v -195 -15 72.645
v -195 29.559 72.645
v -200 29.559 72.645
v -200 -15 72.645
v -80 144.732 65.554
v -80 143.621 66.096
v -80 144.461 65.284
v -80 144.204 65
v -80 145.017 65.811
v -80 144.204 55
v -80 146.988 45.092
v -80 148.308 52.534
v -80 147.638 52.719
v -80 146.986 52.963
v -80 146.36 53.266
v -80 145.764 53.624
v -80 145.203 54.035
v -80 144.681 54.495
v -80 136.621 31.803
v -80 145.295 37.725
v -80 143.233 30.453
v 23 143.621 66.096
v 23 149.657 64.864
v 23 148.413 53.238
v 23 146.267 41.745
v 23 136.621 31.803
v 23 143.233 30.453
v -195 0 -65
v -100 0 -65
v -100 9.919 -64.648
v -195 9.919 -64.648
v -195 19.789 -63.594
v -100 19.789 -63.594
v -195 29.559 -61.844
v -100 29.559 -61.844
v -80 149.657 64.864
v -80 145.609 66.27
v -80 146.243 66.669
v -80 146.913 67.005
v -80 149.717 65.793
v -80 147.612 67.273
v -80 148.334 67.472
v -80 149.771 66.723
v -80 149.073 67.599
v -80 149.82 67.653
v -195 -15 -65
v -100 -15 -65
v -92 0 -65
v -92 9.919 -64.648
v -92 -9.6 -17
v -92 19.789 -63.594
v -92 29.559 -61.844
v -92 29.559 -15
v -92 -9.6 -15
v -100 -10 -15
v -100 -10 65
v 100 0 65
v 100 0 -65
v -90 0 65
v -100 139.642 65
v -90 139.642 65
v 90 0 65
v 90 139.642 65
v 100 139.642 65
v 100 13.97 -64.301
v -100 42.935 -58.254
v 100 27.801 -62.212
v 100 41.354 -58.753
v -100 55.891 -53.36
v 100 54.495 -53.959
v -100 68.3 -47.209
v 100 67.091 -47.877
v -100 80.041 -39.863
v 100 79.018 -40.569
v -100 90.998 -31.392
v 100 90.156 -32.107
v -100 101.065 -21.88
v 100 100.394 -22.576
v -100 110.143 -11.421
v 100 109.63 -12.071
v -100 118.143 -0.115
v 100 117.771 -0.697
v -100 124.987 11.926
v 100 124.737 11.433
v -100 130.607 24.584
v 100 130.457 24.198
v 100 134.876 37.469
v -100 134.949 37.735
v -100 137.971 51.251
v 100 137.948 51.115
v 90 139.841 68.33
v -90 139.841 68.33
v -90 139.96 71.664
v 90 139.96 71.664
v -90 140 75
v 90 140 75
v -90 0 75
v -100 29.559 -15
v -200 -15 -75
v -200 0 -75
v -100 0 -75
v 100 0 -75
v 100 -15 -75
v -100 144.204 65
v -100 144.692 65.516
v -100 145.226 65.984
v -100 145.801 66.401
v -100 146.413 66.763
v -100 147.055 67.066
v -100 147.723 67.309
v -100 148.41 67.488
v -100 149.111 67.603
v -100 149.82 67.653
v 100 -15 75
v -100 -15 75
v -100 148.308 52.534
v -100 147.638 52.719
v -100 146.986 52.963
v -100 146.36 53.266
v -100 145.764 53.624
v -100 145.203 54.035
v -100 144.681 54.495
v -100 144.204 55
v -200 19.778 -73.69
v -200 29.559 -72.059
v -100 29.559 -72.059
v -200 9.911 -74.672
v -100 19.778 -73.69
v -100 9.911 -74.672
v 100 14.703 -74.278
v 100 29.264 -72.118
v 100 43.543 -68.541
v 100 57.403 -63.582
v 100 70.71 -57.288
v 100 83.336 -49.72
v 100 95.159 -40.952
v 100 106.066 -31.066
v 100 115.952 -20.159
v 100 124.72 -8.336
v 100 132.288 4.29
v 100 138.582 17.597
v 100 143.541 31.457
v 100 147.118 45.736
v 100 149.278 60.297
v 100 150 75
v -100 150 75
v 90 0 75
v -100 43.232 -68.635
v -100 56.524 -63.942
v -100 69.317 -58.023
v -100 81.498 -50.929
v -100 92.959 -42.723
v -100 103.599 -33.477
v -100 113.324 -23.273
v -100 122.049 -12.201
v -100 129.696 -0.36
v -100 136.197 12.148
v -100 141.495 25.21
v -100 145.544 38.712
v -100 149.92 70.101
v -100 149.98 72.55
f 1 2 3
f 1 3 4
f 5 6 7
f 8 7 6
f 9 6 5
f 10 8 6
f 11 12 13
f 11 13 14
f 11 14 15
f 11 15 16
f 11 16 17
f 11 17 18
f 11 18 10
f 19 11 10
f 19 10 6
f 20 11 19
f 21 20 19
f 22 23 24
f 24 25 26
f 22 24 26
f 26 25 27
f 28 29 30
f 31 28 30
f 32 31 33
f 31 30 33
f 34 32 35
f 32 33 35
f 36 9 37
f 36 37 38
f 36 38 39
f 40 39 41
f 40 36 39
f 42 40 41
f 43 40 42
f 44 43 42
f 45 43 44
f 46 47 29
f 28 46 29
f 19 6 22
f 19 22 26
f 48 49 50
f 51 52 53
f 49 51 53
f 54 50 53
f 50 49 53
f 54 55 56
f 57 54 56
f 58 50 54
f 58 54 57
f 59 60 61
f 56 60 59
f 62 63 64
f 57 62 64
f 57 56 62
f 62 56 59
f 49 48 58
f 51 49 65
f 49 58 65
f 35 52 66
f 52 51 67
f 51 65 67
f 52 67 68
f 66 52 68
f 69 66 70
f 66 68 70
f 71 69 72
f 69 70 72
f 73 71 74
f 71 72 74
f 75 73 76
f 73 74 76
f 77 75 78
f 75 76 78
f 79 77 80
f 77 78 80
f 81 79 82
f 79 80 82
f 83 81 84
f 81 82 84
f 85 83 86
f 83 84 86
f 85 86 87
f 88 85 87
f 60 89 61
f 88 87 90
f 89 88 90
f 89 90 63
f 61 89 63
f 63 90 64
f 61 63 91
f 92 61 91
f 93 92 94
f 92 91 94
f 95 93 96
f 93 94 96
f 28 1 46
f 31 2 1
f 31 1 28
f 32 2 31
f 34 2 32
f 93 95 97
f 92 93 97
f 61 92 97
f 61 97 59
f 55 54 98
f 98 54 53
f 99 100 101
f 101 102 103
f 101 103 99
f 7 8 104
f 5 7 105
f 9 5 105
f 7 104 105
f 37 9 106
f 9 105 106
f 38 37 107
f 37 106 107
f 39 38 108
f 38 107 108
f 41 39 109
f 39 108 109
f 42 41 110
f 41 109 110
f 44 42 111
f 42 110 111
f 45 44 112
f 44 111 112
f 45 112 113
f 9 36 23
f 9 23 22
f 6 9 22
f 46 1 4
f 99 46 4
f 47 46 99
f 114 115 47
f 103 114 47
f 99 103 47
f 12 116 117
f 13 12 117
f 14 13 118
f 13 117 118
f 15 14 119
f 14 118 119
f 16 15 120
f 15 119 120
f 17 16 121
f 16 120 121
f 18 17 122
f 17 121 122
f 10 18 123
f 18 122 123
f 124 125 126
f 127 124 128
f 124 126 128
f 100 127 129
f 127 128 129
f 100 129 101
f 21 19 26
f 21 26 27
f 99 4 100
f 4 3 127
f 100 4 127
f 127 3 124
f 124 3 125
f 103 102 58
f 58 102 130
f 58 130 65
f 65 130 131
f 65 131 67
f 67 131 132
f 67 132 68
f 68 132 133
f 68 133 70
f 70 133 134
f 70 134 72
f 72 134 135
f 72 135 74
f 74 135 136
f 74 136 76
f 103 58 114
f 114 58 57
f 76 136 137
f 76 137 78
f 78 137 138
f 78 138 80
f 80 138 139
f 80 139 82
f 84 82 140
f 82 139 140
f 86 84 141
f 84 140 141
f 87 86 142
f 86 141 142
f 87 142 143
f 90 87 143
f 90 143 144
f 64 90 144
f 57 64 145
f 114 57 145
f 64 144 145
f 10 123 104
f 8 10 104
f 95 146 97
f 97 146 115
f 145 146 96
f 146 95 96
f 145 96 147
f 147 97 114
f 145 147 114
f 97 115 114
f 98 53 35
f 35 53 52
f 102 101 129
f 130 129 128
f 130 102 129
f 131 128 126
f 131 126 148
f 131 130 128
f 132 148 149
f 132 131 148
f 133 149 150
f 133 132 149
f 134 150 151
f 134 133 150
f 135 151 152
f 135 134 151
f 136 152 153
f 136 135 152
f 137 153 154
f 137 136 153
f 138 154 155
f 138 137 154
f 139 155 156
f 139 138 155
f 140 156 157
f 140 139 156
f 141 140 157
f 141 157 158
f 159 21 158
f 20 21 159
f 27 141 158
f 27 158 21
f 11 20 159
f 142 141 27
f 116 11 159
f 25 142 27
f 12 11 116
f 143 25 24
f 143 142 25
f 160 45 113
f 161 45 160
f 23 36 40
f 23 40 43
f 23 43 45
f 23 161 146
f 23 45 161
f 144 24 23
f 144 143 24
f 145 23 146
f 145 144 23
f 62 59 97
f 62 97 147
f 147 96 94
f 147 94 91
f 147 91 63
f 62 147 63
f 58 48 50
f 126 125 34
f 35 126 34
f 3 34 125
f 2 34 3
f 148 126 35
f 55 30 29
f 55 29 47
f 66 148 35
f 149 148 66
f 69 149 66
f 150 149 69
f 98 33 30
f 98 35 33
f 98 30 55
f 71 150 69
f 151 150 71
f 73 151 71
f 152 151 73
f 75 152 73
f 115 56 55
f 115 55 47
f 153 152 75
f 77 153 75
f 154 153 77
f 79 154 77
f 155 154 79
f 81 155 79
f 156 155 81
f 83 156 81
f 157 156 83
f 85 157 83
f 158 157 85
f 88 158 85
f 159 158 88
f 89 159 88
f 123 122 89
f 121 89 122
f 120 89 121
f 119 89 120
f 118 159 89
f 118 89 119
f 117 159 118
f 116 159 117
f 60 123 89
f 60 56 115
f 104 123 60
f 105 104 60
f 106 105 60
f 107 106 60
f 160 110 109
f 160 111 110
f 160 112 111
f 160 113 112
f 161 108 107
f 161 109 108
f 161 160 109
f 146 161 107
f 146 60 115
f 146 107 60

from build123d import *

# Parameters (mm, degrees)
SKETCH1_W                = 200
SKETCH1_H                = 150
BOSS_EXTRUDE1_DEPTH      = 15
SKETCH1_5_W              = 200
SKETCH1_5_H              = 10
REVOLVE1_ANGLE           = 90
BOSS_EXTRUDE3_REACH      = 197.256
BOSS_EXTRUDE3_END_RADIUS = 140
SKETCH1_6_W              = 10
SKETCH1_6_H              = 10
CUT_EXTRUDE2_DEPTH       = 103
CUT_EXTRUDE3_DEPTH       = 20
CUT_LOFT8_START          = -65
CUT_LOFT8_DEPTH          = 130
CUT_LOFT8_START_2        = -100
CUT_LOFT8_2_DEPTH        = 200
BOSS_EXTRUDE5_DEPTH      = 100
BOSS_EXTRUDE6_START      = -8
BOSS_EXTRUDE6_DEPTH      = 8
BOSS_EXTRUDE7_START      = -5
BOSS_EXTRUDE7_DEPTH      = 5


with BuildPart() as part:
    # Sketch1 → Boss-Extrude1 (new body)
    with BuildSketch(Plane(origin=(0, 0, 0), x_dir=(1, 0, 0), z_dir=(0, 1, 0))):
        Rectangle(SKETCH1_W, SKETCH1_H)
    extrude(amount=-BOSS_EXTRUDE1_DEPTH)

    # Sketch1<5> → Revolve1 (revolve)
    with BuildSketch(Plane(origin=(0, 0, 0), x_dir=(1, 0, 0), z_dir=(0, 1, 0))):
        with Locations((0, 70)):
            Rectangle(SKETCH1_5_W, SKETCH1_5_H)
    revolve(axis=Axis((-100, 0, 75), (1, 0, 0)), revolution_arc=REVOLVE1_ANGLE)

    # Boss-Extrude3: up to this cylinder (the profile starts inside it)
    boss_extrude3_end = Plane(origin=(0, 0, 75), z_dir=(-1, 0, 0)) * Cylinder(BOSS_EXTRUDE3_END_RADIUS, 865.512, mode=Mode.PRIVATE)
    # Sketch1<6> → Boss-Extrude3 (add, up to the surface)
    with BuildSketch(Plane(origin=(0, 0, 0), x_dir=(1, 0, 0), z_dir=(0, 1, 0)), mode=Mode.PRIVATE) as boss_extrude3_sk1:
        with Locations((-95, -70)):
            Rectangle(SKETCH1_6_W, SKETCH1_6_H)
    boss_extrude3_tool1 = extrude(boss_extrude3_sk1.sketch, amount=BOSS_EXTRUDE3_REACH, mode=Mode.PRIVATE) & boss_extrude3_end
    add(boss_extrude3_tool1.solids().sort_by_distance((-95, 0, 70))[0])
    # Sketch1<6> → Boss-Extrude3 (add, up to the surface)
    with BuildSketch(Plane(origin=(0, 0, 0), x_dir=(1, 0, 0), z_dir=(0, 1, 0)), mode=Mode.PRIVATE) as boss_extrude3_sk2:
        with Locations((95, -70)):
            Rectangle(SKETCH1_6_W, SKETCH1_6_H)
    boss_extrude3_tool2 = extrude(boss_extrude3_sk2.sketch, amount=BOSS_EXTRUDE3_REACH, mode=Mode.PRIVATE) & boss_extrude3_end
    add(boss_extrude3_tool2.solids().sort_by_distance((95, 0, 70))[0])

    # Sketch5 → Cut-Extrude2 (cut)
    with BuildSketch(Plane.ZY.offset(80)):
        Polygon((66.095917942, 143.620915339), (31.803061543, 136.620915339), (26.803061543, 161.115812766), (61.095917942, 168.115812766), align=None)
    extrude(amount=-CUT_EXTRUDE2_DEPTH, mode=Mode.SUBTRACT)

    # Sketch6 → Cut-Extrude3 (cut)
    with BuildSketch(Plane.ZY.offset(100)):
        with BuildLine():
            Line((55, 144.203533404), (65, 144.203533404))
            ThreePointArc((65, 144.203533404), (60, 157.655), (55, 144.203533404))
        make_face()
    extrude(amount=-CUT_EXTRUDE3_DEPTH, mode=Mode.SUBTRACT)

    # Cut-Loft8: read off the stored shape, not the designer's step
    # Cut-Loft8 outline → Cut-Loft8 (cut)
    with BuildSketch(Plane.XY.offset(CUT_LOFT8_START)):
        Polygon((-100, -10), (100, 0), (-100, 0), align=None)
    extrude(amount=CUT_LOFT8_DEPTH, mode=Mode.SUBTRACT)

    # Cut-Loft8 2 outline → Cut-Loft8 2 (add)
    with BuildSketch(Plane.YZ.offset(CUT_LOFT8_START_2)):
        Polygon((0, -65), (-10.4, -13), (-12, -13), (-12, -65), align=None)
    extrude(amount=CUT_LOFT8_2_DEPTH)

    # Sketch12 → Boss-Extrude5 (add)
    with BuildSketch(Plane.ZY.offset(100)):
        with BuildLine():
            Line((-65, -15), (-65, 0))
            ThreePointArc((-65, 0), (-64.208776017, 14.863266125), (-61.84404743, 29.558529783))
            Line((-61.84404743, 29.558529783), (-72.058809043, 29.558529783))
            ThreePointArc((-72.058809043, 29.558529783), (-74.262891163, 14.852249722), (-75, 0))
            Line((-75, 0), (-75, -15))
            Line((-75, -15), (-65, -15))
        make_face()
    extrude(amount=BOSS_EXTRUDE5_DEPTH)

    # Sketch12<4> → Boss-Extrude6 (add)
    with BuildSketch(Plane.ZY.offset(100).offset(BOSS_EXTRUDE6_START)):
        with BuildLine():
            Line((-65, 0), (-15, -10))
            Line((-15, -10), (-15, 29.558529783))
            Line((-15, 29.558529783), (-61.84404743, 29.558529783))
            ThreePointArc((-61.84404743, 29.558529783), (-64.208776017, 14.863266125), (-65, 0))
        make_face()
    extrude(amount=BOSS_EXTRUDE6_DEPTH)

    # Sketch21 → Boss-Extrude7 (add)
    with BuildSketch(Plane.ZY.offset(200).offset(BOSS_EXTRUDE7_START)):
        with BuildLine():
            Line((-61.84404743, 29.558529783), (72.644533384, 29.558529783))
            Line((72.644533384, 29.558529783), (72.644533384, -15))
            Line((72.644533384, -15), (-65, -15))
            Line((-65, -15), (-65, 0))
            ThreePointArc((-65, 0), (-64.208776017, 14.863266125), (-61.84404743, 29.558529783))
        make_face()
    extrude(amount=BOSS_EXTRUDE7_DEPTH)


solid = part.part
